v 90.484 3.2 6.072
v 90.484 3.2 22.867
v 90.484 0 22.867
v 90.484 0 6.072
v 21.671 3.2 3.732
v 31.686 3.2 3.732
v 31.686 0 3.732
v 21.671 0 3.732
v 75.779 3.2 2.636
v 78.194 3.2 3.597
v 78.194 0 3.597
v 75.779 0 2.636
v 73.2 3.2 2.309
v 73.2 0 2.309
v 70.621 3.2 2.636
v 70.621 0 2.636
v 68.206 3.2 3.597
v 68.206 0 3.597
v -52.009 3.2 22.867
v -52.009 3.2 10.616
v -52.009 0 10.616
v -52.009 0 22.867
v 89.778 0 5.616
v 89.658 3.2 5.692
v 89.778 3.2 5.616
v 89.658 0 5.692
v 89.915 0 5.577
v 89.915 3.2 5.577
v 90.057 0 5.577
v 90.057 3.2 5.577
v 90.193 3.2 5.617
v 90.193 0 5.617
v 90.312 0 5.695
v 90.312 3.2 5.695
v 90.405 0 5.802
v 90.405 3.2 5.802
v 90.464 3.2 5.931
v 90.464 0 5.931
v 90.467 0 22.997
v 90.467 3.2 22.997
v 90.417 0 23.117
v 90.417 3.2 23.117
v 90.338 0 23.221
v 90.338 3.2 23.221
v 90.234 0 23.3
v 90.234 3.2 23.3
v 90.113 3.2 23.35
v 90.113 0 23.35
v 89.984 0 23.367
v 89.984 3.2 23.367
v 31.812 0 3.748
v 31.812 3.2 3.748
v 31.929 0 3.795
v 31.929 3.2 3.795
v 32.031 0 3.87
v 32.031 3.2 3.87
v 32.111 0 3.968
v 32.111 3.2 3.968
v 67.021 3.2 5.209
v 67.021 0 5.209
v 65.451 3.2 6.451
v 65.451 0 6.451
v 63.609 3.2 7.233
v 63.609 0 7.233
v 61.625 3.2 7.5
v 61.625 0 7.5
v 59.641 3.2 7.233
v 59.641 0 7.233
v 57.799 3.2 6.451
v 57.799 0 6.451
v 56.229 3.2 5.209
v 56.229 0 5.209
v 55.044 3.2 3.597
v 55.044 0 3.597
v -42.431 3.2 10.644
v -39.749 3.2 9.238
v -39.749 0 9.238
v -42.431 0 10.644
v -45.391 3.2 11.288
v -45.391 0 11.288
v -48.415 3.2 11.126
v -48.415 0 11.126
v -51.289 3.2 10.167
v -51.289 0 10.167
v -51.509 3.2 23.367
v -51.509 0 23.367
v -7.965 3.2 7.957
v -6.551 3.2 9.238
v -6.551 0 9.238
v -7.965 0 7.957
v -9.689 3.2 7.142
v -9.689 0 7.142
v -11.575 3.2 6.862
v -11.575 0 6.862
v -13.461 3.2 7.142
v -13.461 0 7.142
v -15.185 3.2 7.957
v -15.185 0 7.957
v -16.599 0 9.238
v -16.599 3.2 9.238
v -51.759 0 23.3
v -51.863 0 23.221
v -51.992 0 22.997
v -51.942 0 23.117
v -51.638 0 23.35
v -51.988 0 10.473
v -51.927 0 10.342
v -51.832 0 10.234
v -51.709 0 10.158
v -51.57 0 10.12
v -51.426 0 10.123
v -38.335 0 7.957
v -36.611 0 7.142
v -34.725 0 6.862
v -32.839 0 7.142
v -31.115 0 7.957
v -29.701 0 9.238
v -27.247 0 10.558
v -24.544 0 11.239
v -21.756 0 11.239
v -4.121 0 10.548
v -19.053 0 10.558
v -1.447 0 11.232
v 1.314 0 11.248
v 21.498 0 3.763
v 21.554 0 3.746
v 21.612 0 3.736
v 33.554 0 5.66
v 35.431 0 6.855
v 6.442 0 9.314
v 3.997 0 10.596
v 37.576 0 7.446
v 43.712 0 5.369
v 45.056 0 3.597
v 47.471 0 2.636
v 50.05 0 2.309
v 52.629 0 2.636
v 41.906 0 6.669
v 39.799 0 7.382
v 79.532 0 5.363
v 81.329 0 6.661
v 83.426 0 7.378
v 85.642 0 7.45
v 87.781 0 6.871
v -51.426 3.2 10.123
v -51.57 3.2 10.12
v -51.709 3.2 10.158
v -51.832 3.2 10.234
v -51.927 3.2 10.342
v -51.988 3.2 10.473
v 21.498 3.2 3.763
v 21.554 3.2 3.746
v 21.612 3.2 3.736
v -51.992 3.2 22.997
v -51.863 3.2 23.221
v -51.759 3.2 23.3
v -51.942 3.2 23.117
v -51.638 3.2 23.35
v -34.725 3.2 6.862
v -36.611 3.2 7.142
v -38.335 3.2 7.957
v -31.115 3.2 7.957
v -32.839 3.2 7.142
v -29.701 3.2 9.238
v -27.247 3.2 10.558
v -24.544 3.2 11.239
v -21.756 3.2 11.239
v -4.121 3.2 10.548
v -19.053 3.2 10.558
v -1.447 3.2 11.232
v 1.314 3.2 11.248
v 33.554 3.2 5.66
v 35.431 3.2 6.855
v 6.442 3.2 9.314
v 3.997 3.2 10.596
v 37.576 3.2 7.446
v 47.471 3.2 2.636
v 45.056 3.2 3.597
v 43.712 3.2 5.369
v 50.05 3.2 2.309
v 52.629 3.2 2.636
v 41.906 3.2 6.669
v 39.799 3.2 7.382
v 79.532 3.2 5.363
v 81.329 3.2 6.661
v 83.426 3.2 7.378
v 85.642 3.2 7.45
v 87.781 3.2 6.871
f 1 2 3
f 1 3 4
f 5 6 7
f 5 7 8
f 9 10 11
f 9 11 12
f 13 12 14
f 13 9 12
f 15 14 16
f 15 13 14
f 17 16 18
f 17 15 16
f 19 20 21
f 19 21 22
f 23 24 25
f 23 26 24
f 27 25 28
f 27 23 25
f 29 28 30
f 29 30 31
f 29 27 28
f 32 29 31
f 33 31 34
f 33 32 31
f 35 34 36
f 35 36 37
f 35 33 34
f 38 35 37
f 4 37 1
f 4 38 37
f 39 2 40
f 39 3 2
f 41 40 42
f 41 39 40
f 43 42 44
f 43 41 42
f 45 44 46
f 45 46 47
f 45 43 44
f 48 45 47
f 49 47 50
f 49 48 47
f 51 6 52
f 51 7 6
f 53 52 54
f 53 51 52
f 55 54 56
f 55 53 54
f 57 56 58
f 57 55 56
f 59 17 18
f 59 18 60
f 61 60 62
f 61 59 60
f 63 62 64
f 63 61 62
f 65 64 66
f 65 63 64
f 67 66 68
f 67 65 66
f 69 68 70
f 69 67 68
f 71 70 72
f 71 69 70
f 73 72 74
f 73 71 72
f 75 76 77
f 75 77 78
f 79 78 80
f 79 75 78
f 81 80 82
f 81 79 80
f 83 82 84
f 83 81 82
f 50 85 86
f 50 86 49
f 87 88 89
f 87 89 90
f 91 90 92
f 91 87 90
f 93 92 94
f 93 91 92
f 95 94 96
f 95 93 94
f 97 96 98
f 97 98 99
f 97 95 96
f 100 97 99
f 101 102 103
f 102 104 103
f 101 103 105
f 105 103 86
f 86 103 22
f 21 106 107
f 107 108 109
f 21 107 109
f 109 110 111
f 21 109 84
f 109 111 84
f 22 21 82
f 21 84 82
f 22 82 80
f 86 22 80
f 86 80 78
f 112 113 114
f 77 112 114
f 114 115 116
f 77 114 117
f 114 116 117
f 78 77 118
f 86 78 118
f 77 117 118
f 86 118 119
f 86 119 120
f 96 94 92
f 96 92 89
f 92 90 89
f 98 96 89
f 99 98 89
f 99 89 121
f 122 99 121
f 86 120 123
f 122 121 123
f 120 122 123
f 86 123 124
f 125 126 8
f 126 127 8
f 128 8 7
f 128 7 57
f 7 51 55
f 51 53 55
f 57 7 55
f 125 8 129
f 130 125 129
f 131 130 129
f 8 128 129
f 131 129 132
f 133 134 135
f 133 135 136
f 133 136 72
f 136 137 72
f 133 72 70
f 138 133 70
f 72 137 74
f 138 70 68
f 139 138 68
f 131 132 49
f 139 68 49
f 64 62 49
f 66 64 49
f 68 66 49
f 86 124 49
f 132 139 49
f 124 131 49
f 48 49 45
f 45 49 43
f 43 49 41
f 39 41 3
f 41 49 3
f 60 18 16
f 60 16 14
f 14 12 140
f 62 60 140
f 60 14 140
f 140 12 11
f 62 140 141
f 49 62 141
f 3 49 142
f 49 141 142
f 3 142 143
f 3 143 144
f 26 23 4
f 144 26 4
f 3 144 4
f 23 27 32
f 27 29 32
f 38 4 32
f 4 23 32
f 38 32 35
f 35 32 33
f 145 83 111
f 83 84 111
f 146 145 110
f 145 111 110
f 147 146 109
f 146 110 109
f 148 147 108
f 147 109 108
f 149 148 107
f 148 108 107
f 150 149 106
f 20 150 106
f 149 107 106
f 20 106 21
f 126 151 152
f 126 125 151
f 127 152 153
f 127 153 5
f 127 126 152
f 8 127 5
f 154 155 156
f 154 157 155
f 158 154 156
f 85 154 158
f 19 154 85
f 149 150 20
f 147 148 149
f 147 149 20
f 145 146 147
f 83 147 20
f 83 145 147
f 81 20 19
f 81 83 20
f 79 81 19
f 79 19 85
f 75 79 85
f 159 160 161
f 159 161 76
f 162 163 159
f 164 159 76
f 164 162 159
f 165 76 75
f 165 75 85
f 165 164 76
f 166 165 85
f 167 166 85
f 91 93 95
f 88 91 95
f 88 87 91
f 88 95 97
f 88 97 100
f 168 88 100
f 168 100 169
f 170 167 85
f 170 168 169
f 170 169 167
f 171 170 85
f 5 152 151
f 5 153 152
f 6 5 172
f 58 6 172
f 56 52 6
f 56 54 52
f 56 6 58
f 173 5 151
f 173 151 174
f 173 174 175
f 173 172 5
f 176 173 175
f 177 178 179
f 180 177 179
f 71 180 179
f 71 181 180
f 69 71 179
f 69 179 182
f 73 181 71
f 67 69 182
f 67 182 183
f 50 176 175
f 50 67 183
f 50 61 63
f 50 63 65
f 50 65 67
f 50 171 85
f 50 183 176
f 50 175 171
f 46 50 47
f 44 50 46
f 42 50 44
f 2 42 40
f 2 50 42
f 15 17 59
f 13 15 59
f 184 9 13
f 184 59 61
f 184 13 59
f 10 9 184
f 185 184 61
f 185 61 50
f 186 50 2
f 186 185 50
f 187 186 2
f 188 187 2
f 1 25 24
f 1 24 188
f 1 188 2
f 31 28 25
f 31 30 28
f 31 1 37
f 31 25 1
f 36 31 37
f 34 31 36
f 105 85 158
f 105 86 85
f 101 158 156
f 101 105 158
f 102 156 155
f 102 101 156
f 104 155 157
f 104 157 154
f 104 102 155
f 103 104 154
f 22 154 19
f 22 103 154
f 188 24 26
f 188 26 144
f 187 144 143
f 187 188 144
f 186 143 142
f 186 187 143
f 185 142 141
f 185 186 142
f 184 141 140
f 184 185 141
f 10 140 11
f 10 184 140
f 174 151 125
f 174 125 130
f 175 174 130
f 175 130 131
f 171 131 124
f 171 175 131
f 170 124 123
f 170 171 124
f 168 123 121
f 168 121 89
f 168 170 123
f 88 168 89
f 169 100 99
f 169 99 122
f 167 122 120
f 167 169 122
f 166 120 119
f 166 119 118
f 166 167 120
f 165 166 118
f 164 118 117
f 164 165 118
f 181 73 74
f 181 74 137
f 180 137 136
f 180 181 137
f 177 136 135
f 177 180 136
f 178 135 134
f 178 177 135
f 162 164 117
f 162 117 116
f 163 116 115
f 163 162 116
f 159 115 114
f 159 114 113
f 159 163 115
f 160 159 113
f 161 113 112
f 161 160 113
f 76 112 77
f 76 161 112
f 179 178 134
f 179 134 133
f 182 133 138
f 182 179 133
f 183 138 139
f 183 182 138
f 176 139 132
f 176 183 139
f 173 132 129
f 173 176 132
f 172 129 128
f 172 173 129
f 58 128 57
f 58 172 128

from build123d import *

# Parameters (mm, degrees)
BOSS_EXTRUDE1_DEPTH = 3.2
SKETCH2_W           = 159.499713068
SKETCH2_H           = 43.7032655
CUT_EXTRUDE1_DEPTH  = 3.2
FILLET1_R           = 0.5


with BuildPart() as part:
    # Sketch1 → Boss-Extrude1 (new body)
    with BuildSketch(Plane(origin=(0, 0, 0), x_dir=(1, 0, 0), z_dir=(0, 1, 0))):
        with BuildLine():
            Line((-52.508964924, -8.867320879), (-52.508964924, -23.867320879))
            Line((-52.508964924, -23.867320879), (90.983964924, -23.867320879))
            Line((90.983964924, -23.867320879), (90.983964924, -3.232453337))
            ThreePointArc((90.983964924, -3.232453337), (84.775, -7), (78.566035076, -3.232453337))
            ThreePointArc((78.566035076, -3.232453337), (73.2, -1.808851774), (67.833964924, -3.232453337))
            ThreePointArc((67.833964924, -3.232453337), (61.625, -7), (55.416035076, -3.232453337))
            ThreePointArc((55.416035076, -3.232453337), (50.05, -1.808851774), (44.683964924, -3.232453337))
            ThreePointArc((44.683964924, -3.232453337), (38.475, -7), (32.266035076, -3.232453337))
            Line((32.266035076, -3.232453337), (21.492035076, -3.232453337))
            Line((21.492035076, -3.232453337), (6.208964923, -8.867320879))
            ThreePointArc((6.208964923, -8.867320879), (0, -10.825), (-6.208964924, -8.867320879))
            ThreePointArc((-6.208964924, -8.867320879), (-11.575, -6.362392354), (-16.941035077, -8.867320879))
            ThreePointArc((-16.941035077, -8.867320879), (-23.15, -10.825), (-29.358964924, -8.867320879))
            ThreePointArc((-29.358964924, -8.867320879), (-34.725, -6.362392354), (-40.091035076, -8.867320879))
            ThreePointArc((-40.091035076, -8.867320879), (-46.3, -10.825), (-52.508964924, -8.867320879))
        make_face()
    extrude(amount=BOSS_EXTRUDE1_DEPTH)

    # Sketch2 → Cut-Extrude1 (cut)
    with BuildSketch(Plane(origin=(0, 3.2, 0), x_dir=(1, 0, 0), z_dir=(0, 1, 0))):
        with Locations((19.511770452, -6.74153154)):
            Rectangle(SKETCH2_W, SKETCH2_H)
        with BuildLine():
            Line((-52.008964924, -9.780764004), (-52.008964924, -23.367320879))
            Line((-52.008964924, -23.367320879), (90.483964924, -23.367320879))
            Line((90.483964924, -23.367320879), (90.483964924, -4.863920178))
            ThreePointArc((90.483964924, -4.863920178), (84.005832381, -7.460454488), (78.193740084, -3.596806627))
            ThreePointArc((78.193740084, -3.596806627), (73.2, -2.308851774), (68.206259916, -3.596806627))
            ThreePointArc((68.206259916, -3.596806627), (61.625, -7.5), (55.043740084, -3.596806627))
            ThreePointArc((55.043740084, -3.596806627), (50.05, -2.308851774), (45.056259916, -3.596806627))
            ThreePointArc((45.056259916, -3.596806627), (38.552735975, -7.49959713), (31.969710453, -3.732453337))
            Line((31.969710453, -3.732453337), (21.581273902, -3.732453337))
            Line((21.581273902, -3.732453337), (6.442002791, -9.314302177))
            ThreePointArc((6.442002791, -9.314302177), (-0.066748771, -11.324803292), (-6.551349026, -9.237718925))
            ThreePointArc((-6.551349026, -9.237718925), (-11.575, -6.862392354), (-16.598650974, -9.237718925))
            ThreePointArc((-16.598650974, -9.237718925), (-23.15, -11.325), (-29.701349026, -9.237718925))
            ThreePointArc((-29.701349026, -9.237718925), (-34.725, -6.862392354), (-39.748650974, -9.237718925))
            ThreePointArc((-39.748650974, -9.237718925), (-45.798874034, -11.313907272), (-52.008964924, -9.780764004))
        make_face(mode=Mode.SUBTRACT)
    extrude(amount=-CUT_EXTRUDE1_DEPTH, mode=Mode.SUBTRACT)

    # Fillet1
    fillet1_edges = [part.edges().sort_by_distance(p)[0] for p in [
        (21.581273902, 1.6, 3.732453337),
        (31.969710453, 1.6, 3.732453337),
        (90.483964924, 1.6, 4.863920178),
        (90.483964924, 1.6, 23.367320879),
        (-52.008964924, 1.6, 23.367320879),
        (-52.008964924, 1.6, 9.780764004),
    ]]
    fillet(fillet1_edges, radius=FILLET1_R)


solid = part.part
